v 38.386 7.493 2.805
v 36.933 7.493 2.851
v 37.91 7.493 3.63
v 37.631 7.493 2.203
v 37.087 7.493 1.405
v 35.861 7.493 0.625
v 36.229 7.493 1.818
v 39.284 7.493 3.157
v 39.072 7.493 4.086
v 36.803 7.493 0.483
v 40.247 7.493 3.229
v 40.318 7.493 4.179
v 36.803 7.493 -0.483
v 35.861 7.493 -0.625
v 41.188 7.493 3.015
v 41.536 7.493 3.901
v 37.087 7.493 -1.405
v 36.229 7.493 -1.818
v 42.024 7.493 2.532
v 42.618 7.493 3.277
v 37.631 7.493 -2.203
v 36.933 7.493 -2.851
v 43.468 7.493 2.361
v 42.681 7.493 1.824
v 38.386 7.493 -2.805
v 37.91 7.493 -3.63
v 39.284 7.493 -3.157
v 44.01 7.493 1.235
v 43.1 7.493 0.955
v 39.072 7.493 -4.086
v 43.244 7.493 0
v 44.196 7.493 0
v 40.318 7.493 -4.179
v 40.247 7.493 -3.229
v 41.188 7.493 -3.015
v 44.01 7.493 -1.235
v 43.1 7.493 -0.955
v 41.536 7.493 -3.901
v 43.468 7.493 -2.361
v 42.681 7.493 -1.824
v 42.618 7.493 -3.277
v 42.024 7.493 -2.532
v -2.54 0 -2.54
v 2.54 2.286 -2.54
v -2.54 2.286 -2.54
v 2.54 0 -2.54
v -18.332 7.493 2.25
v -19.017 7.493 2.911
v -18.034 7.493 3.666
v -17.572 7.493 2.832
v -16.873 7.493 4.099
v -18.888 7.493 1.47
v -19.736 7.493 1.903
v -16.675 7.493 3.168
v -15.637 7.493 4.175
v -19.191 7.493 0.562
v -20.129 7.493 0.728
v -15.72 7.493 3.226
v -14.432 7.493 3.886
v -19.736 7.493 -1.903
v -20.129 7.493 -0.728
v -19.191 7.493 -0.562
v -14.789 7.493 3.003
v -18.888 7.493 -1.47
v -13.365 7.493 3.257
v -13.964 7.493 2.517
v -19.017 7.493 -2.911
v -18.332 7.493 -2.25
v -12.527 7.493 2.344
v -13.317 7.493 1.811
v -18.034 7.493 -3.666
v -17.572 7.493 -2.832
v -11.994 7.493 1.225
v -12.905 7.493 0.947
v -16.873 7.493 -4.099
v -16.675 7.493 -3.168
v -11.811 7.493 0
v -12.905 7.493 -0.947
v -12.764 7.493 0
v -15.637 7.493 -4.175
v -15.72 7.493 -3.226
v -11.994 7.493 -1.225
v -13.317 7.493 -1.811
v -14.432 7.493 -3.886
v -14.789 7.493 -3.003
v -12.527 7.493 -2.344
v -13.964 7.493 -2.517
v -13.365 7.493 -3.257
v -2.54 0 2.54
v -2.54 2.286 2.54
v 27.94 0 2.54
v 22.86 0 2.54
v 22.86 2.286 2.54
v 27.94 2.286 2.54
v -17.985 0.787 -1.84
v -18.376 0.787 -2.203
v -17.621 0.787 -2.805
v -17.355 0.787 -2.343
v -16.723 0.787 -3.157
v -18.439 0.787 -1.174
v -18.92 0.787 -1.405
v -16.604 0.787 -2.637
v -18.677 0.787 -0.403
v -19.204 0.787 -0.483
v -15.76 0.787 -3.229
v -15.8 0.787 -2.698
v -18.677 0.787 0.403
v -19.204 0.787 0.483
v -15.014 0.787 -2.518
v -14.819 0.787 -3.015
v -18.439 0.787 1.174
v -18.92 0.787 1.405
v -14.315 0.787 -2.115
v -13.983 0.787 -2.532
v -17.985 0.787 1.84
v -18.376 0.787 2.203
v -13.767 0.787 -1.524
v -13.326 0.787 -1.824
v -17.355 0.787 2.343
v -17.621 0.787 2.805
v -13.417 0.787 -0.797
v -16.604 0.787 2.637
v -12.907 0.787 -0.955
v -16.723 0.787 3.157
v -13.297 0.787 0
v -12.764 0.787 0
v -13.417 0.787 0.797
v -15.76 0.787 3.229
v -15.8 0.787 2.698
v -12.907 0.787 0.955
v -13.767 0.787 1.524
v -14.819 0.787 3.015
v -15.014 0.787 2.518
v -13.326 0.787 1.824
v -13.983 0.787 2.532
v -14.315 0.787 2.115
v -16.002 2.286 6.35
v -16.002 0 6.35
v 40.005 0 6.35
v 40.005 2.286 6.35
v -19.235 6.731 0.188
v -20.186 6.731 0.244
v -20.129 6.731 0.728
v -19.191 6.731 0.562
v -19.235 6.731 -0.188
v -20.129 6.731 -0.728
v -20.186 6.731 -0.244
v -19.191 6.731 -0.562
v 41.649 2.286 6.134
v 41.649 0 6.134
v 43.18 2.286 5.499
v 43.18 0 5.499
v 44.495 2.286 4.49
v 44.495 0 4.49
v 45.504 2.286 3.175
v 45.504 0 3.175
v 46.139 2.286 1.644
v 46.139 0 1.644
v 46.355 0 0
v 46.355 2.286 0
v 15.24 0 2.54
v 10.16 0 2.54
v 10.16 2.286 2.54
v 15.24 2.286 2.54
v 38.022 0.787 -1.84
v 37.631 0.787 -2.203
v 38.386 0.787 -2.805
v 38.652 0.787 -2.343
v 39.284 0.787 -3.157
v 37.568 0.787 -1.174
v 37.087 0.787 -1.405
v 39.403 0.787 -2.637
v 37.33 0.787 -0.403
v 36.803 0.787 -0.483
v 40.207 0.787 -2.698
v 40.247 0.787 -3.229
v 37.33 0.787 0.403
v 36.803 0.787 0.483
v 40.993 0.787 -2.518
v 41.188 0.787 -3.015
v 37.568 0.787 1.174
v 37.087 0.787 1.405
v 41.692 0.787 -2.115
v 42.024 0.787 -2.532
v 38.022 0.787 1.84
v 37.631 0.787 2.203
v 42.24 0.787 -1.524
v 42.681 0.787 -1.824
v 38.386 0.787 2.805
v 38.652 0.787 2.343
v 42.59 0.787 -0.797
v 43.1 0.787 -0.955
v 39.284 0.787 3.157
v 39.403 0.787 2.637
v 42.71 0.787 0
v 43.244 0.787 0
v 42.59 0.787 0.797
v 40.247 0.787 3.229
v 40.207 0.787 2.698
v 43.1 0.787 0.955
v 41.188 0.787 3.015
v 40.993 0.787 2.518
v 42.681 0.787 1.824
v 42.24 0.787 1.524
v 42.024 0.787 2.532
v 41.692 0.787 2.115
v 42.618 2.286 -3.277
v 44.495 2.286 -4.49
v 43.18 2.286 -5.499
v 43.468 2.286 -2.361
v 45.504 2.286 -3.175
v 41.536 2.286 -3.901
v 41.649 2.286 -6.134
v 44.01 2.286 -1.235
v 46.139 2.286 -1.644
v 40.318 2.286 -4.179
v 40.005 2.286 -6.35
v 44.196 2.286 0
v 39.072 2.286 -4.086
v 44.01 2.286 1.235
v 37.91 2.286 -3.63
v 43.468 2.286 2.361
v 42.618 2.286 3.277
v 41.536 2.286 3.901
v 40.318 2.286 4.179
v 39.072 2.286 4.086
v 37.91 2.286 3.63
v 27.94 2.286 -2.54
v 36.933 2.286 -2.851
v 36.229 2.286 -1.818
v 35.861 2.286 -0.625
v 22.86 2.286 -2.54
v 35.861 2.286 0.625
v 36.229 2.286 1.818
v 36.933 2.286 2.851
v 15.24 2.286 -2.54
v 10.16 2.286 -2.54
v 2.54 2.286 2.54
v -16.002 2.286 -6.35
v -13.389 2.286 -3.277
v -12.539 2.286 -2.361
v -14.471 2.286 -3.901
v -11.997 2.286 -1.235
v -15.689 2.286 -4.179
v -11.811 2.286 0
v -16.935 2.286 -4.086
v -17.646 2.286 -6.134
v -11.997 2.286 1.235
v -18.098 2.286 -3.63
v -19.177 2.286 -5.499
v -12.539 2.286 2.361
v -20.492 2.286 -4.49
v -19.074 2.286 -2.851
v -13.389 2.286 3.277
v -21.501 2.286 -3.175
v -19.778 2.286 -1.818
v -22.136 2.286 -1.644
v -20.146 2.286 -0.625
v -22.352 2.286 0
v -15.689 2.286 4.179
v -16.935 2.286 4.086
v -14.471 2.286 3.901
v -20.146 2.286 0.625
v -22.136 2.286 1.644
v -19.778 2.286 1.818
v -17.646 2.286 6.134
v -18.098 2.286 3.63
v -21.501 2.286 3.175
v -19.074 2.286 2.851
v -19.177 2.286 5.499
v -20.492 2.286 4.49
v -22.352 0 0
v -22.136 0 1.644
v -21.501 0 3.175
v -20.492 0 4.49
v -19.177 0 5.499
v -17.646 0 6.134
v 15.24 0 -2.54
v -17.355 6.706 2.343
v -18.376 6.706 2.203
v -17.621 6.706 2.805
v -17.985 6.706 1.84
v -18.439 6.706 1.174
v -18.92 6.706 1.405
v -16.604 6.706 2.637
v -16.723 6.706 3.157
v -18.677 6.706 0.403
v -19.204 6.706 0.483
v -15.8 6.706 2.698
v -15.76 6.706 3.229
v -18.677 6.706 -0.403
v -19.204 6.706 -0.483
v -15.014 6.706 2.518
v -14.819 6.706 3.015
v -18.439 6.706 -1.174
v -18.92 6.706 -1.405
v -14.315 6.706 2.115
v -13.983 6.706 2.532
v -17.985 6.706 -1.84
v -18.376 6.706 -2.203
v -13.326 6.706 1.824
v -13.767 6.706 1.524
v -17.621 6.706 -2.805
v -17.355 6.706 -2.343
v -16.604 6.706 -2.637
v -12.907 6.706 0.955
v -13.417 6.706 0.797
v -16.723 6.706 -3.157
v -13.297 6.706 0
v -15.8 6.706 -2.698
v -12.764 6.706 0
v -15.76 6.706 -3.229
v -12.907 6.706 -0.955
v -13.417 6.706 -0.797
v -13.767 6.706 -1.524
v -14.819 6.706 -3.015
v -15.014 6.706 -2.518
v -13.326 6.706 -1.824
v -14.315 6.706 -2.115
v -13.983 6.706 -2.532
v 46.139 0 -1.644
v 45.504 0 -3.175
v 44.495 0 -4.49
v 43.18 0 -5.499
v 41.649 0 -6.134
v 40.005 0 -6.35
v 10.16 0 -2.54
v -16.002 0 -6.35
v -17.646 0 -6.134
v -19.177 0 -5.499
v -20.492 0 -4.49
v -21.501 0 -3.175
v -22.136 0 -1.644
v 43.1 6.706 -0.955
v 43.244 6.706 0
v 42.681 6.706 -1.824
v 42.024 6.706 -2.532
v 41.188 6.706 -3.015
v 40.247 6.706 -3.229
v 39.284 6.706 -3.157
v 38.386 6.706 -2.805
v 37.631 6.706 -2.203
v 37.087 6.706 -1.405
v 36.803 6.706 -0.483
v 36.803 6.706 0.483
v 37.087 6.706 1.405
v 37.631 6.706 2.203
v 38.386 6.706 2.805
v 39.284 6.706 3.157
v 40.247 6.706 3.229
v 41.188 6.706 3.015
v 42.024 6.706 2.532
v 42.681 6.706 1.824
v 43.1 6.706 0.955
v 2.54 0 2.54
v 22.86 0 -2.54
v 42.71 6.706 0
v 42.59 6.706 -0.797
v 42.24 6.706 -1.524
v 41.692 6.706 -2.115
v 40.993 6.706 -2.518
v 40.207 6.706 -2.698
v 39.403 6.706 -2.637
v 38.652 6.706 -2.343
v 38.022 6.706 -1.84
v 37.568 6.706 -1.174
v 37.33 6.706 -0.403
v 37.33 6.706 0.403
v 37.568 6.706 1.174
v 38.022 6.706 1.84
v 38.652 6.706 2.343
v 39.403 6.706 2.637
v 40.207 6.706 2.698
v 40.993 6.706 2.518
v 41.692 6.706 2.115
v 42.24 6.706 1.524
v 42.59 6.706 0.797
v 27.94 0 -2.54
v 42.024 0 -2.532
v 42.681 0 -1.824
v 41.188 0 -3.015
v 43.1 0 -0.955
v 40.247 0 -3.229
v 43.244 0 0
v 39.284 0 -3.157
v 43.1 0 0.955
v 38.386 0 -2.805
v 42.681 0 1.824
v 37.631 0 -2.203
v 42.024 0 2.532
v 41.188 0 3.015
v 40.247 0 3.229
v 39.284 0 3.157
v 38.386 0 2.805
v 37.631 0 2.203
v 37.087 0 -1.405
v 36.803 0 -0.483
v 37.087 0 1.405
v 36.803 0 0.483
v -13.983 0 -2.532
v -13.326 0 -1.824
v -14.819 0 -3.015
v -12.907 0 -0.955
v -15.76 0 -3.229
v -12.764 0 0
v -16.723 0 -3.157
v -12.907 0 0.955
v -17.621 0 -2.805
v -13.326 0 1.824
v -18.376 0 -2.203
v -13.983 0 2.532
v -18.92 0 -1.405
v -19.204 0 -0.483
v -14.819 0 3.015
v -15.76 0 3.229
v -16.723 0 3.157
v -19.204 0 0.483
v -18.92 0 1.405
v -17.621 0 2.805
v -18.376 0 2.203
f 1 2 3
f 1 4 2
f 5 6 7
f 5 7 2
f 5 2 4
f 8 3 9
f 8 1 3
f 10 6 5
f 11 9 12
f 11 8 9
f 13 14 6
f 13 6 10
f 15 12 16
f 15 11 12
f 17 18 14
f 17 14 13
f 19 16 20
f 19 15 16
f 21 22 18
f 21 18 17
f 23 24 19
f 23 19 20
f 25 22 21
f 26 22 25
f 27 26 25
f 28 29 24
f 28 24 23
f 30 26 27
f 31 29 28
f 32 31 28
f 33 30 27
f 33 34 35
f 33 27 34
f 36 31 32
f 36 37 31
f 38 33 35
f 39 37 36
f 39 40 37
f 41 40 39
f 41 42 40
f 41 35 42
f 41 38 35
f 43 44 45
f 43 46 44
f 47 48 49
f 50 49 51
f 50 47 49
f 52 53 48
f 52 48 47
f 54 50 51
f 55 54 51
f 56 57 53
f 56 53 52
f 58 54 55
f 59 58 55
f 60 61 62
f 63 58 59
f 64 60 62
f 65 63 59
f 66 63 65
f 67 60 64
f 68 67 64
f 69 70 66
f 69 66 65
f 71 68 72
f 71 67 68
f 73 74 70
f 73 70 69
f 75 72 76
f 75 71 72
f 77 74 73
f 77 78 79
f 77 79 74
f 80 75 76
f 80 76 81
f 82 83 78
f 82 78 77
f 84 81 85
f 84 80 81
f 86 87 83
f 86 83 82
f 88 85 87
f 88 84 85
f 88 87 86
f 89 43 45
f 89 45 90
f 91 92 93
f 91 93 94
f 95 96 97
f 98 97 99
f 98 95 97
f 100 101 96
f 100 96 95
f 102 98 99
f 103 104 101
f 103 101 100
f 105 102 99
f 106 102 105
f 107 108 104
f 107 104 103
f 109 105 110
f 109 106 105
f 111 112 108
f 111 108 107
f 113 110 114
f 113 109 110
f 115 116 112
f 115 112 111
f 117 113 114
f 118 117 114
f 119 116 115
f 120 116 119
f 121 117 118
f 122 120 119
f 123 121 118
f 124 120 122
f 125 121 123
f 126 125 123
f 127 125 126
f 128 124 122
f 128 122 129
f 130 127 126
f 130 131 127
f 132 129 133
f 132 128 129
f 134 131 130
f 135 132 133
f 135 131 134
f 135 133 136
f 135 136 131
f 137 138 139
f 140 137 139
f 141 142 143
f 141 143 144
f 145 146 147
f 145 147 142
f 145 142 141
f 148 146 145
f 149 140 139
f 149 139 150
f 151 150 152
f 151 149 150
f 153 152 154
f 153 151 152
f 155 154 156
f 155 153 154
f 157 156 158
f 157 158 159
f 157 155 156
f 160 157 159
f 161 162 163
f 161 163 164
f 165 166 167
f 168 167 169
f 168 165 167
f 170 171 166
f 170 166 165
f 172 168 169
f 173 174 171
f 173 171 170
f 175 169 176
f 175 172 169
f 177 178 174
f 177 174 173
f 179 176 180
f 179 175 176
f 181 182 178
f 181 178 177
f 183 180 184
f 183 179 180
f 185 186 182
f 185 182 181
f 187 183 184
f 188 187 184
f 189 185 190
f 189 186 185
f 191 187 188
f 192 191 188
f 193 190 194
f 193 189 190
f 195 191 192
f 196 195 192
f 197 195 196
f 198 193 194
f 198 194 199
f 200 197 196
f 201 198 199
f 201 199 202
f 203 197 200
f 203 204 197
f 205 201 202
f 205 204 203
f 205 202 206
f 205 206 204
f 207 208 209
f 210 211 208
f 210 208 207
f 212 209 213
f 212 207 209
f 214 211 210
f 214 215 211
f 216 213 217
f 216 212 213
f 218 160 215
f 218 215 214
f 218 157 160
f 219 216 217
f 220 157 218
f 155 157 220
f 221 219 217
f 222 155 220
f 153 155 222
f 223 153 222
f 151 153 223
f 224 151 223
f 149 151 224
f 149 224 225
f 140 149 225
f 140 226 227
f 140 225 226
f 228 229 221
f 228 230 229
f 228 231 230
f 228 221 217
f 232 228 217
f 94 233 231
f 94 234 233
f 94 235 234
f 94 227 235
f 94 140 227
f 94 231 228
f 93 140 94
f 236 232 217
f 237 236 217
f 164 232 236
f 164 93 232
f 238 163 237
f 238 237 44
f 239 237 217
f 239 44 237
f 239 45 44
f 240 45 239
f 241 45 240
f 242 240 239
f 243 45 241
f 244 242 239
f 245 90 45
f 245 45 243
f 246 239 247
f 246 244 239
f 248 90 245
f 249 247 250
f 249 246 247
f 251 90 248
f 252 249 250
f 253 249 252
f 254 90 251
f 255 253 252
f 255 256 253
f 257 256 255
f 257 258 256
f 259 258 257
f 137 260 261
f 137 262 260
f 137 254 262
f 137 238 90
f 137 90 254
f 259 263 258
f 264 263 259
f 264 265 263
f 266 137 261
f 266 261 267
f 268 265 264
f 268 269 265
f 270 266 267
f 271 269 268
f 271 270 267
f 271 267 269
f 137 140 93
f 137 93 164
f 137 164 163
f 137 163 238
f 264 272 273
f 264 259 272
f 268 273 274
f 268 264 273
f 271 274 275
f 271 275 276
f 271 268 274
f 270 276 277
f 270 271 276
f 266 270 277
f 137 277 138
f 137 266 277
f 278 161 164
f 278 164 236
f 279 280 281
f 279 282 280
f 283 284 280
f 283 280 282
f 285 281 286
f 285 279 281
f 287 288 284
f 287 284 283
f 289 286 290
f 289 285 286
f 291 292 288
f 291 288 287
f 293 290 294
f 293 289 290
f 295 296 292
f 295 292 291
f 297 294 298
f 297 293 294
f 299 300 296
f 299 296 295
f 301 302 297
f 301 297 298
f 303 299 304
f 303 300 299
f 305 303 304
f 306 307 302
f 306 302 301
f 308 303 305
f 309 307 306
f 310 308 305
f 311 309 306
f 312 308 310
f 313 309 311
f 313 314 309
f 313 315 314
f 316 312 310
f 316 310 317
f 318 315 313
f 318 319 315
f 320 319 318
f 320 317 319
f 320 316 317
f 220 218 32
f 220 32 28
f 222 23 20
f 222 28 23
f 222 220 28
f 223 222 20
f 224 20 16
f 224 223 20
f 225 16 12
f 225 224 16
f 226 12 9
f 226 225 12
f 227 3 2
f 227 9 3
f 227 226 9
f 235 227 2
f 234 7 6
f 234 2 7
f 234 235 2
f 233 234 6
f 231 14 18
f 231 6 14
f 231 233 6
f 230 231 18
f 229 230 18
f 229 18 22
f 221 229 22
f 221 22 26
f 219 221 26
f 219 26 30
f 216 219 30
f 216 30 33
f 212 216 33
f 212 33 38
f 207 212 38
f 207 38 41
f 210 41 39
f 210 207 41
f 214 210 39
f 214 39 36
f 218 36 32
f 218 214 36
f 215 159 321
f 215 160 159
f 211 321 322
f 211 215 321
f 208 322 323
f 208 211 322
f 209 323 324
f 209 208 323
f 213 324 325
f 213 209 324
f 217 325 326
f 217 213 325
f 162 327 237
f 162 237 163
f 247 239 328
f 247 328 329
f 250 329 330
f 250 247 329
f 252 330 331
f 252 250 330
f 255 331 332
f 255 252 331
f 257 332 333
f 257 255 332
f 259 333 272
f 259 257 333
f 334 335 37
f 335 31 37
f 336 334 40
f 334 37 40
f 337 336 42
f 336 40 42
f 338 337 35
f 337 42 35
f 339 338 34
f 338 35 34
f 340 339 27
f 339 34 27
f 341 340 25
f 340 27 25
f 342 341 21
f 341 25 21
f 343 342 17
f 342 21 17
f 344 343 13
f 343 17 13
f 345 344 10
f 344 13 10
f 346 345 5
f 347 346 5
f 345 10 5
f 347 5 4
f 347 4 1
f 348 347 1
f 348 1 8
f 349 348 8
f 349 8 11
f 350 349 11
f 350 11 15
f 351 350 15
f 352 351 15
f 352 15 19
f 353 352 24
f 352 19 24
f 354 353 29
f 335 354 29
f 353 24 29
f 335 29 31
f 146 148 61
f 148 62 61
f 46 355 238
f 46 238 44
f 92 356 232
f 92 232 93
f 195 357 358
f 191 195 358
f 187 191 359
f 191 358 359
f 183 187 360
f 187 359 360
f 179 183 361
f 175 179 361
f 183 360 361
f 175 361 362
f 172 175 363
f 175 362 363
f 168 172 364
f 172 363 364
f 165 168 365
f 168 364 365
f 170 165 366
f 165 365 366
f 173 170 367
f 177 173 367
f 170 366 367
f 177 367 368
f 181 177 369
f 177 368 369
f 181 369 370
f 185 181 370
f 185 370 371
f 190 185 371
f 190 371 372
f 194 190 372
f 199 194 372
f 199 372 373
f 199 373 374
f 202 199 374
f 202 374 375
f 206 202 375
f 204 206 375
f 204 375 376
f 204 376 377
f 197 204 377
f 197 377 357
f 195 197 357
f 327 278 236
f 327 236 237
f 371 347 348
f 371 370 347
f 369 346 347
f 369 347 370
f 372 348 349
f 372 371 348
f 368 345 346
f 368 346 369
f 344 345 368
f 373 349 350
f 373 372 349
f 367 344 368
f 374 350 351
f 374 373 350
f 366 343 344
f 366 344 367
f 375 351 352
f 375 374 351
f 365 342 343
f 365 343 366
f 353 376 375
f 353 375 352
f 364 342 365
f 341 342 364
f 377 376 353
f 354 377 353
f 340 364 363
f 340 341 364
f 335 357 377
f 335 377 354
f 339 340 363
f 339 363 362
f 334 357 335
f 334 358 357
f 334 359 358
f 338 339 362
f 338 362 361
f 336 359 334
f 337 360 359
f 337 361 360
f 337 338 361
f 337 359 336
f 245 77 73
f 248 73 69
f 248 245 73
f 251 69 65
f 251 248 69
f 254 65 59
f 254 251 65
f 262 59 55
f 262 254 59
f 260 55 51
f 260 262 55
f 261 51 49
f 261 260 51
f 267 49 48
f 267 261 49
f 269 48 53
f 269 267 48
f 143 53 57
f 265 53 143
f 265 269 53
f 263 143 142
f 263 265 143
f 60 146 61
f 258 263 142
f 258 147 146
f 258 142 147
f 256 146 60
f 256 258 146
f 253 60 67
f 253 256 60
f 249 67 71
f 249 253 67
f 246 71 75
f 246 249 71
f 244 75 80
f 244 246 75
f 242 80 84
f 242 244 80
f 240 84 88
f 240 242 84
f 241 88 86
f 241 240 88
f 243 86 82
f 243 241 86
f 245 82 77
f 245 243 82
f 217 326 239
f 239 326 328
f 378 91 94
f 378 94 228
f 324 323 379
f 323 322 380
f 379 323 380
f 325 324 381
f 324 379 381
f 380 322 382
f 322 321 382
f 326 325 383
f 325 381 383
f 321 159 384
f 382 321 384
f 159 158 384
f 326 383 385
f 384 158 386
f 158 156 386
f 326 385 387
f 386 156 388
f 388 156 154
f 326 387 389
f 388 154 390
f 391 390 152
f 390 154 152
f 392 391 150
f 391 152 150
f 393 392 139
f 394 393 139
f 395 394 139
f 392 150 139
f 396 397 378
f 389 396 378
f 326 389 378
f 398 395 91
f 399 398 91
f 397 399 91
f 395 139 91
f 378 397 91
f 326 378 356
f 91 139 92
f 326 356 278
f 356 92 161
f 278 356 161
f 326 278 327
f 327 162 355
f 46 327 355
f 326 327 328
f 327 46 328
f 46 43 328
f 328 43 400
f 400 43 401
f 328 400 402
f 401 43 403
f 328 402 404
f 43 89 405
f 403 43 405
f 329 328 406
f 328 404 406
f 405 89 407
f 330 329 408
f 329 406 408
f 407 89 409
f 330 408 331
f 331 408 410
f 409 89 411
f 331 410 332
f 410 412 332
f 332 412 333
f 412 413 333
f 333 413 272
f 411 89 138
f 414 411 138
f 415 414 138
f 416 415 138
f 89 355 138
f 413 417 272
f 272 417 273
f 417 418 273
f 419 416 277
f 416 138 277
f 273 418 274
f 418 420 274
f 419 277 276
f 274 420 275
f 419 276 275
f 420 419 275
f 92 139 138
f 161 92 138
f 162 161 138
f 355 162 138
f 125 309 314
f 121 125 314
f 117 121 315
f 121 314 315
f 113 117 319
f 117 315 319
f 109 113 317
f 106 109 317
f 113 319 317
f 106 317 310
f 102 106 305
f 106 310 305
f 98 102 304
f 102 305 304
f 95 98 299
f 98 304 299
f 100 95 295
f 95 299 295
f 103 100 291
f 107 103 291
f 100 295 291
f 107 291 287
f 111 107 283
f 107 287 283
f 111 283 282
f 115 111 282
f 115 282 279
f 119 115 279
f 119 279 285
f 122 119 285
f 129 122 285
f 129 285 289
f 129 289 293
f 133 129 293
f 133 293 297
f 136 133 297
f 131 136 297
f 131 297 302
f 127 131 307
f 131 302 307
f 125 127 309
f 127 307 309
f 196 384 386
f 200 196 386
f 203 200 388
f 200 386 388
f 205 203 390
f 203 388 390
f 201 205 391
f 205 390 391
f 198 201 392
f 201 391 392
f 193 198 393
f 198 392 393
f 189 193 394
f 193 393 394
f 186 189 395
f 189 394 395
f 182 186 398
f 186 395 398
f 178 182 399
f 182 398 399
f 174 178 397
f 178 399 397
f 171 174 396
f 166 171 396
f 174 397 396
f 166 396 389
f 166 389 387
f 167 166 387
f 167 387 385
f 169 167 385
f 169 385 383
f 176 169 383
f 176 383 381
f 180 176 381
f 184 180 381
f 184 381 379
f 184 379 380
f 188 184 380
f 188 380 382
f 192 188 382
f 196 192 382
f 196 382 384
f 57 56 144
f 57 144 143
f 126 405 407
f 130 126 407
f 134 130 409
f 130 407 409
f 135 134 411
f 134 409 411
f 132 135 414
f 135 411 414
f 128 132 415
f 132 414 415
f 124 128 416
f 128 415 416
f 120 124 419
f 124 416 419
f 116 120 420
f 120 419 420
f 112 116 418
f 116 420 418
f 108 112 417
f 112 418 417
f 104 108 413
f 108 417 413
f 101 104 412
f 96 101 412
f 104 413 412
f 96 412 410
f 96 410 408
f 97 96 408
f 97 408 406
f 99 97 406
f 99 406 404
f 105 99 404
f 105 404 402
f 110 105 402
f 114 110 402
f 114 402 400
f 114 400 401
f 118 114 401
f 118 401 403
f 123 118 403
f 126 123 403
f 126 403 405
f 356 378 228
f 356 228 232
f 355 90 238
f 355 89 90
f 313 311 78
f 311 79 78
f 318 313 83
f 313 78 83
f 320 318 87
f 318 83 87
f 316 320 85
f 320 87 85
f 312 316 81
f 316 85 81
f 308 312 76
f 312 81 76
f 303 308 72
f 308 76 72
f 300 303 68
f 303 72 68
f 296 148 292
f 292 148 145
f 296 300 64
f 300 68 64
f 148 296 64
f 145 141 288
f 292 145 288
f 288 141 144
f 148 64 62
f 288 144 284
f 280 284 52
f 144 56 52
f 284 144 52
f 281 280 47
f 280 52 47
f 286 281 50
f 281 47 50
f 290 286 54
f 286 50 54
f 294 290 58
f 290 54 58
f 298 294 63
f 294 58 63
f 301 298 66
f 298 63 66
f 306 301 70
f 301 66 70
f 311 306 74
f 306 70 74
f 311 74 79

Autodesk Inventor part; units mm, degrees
ref_plane "YZ Plane" through (0, 0, 0) normal (1, 0, 0) x (0, 1, 0)
ref_plane "XZ Plane" through (0, 0, 0) normal (0, 1, 0) x (-1, 0, 0)
ref_plane "XY Plane" through (0, 0, 0) normal (0, 0, 1) x (1, 0, 0)
sketch "Sketch1" plane through (0, 0, 0) normal (0, 1, 0) x (-1, 0, 0)
  line L0 (22.352, 6.35) -> (-46.355, 6.35)
  line L1 (-46.355, 6.35) -> (-46.355, -6.35)
  line L2 (-46.355, -6.35) -> (22.352, -6.35)
  line L3 (22.352, -6.35) -> (22.352, 6.35)
  line L4 (-2.54, -2.54) -> (2.54, -2.54)
  line L5 (2.54, -2.54) -> (2.54, 2.54)
  line L6 (2.54, 2.54) -> (-2.54, 2.54)
  line L7 (-2.54, 2.54) -> (-2.54, -2.54)
  line L8 (-2.54, -2.54) -> (2.54, 2.54) construction
  line L9 (2.54, -2.54) -> (-2.54, 2.54) construction
  line L10 (-10.16, 2.54) -> (-15.24, 2.54)
  line L11 (-15.24, 2.54) -> (-15.24, -2.54)
  line L12 (-15.24, -2.54) -> (-10.16, -2.54)
  line L13 (-10.16, -2.54) -> (-10.16, 2.54)
  line L14 (-10.16, 2.54) -> (-15.24, -2.54) construction
  line L15 (-15.24, 2.54) -> (-10.16, -2.54) construction
  line L16 (-22.86, 2.54) -> (-27.94, 2.54)
  line L17 (-27.94, 2.54) -> (-27.94, -2.54)
  line L18 (-27.94, -2.54) -> (-22.86, -2.54)
  line L19 (-22.86, -2.54) -> (-22.86, 2.54)
  line L20 (-22.86, 2.54) -> (-27.94, -2.54) construction
  line L21 (-27.94, 2.54) -> (-22.86, -2.54) construction
  point P0 (0, 0)
  point P1 (-12.7, 0)
  point P2 (-25.4, 0)
  dimension "d0" = 68.707
  dimension "d1" = 12.7
  dimension "d2" = 5.08
  dimension "d3" = 5.08
  dimension "d4" = 5.08
  dimension "d5" = 5.08
  dimension "d6" = 12.7
  dimension "d7" = 12.7
  dimension "d8" = 6.35
  dimension "d9" = 22.352
  dimension "d37" = 5.08
  dimension "d38" = 5.08
extrude "Extrusion1" add sketch "Sketch1" along normal blind 2.286
sketch "Sketch2" plane through (0, 2.286, 0) normal (0, 1, 0) x (1, 0, 0)
  line L0 (-22.352, 6.35) -> (-22.352, -6.35) projected
  circle A0 centre (-16.002, 0) radius 4.191
  point P0 (0, 0)
  dimension "d12" = 6.35
  dimension "d13" = 8.382
extrude "Extrusion2" add sketch "Sketch2" along normal blind 5.207
sketch "Sketch3" plane through (-16.002, 7.493, 0) normal (0, 1, 0) x (1, 0, 0)
  circle A0 centre (0, 0) radius 3.2385
  point P0 (16.002, 0)
  dimension "d16" = 6.477
extrude "Extrusion3" cut sketch "Sketch3" against normal blind 0.7874
sketch "Sketch4" plane through (0, 0, 0) normal (0, -1, 0) x (1, 0, 0)
  circle A0 centre (-16.002, 0) radius 3.2385 projected
  circle A1 centre (-16.002, 0) radius 3.2385
  point P0 (0, 0)
  dimension "d39" = 6.477
extrude "Extrusion4" cut sketch "Sketch4" against normal blind 0.7874
sketch "Sketch5" plane through (-16.002, 6.7056, 0) normal (0, 1, 0) x (1, 0, 0)
  circle A0 centre (0, 0) radius 2.7051
  point P0 (16.002, 0)
  dimension "d21" = 5.4102
extrude "Extrusion5" cut sketch "Sketch5" against normal through all
sketch "Sketch6" plane through (0, 2.286, 0) normal (0, 1, 0) x (1, 0, 0)
  line L0 (46.355, -6.35) -> (46.355, 6.35) projected
  circle A0 centre (40.005, 0) radius 4.191
  point P0 (0, 0)
  dimension "d24" = 6.35
  dimension "d25" = 8.382
extrude "Extrusion6" add sketch "Sketch6" along normal blind 5.207
sketch "Sketch7" plane through (40.005, 7.493, 0) normal (0, 1, 0) x (1, 0, 0)
  circle A0 centre (0, 0) radius 3.2385
  point P0 (-40.005, 0)
  dimension "d28" = 6.477
extrude "Extrusion7" cut sketch "Sketch7" against normal blind 0.7874
sketch "Sketch8" plane through (0, 0, 0) normal (0, -1, 0) x (1, 0, 0)
  circle A0 centre (40.005, 0) radius 3.2385 projected
  circle A1 centre (40.005, 0) radius 3.2385
  point P0 (0, 0)
  dimension "d40" = 6.477
extrude "Extrusion8" cut sketch "Sketch8" against normal blind 0.7874
sketch "Sketch9" plane through (40.005, 6.7056, 0) normal (0, 1, 0) x (1, 0, 0)
  circle A0 centre (0, 0) radius 2.7051
  point P0 (-40.005, 0)
  dimension "d33" = 5.4102
extrude "Extrusion9" cut sketch "Sketch9" against normal through all
fillet "Fillet1" radius 6.35 4 edges at (46.355, 1.143, 6.35) (46.355, 1.143, -6.35) (-22.352, 1.143, 6.35) (-22.352, 1.143, -6.35)
sketch "Sketch12" plane through (-16.002, 7.493, 0) normal (0, 1, 0) x (1, 0, 0)
  circle A0 centre (0, 0) radius 4.191 projected
  line L0 (0, 0) -> (4.0259, 0) construction
  line L1 (0, 0) -> (4.0259, 0) construction
  circle A1 centre (0, 0) radius 3.2385 projected
  line L2 (-3.1893, 0.5624) -> (-4.1273, 0.7278)
  line L3 (-3.1893, -0.5624) -> (-4.1273, -0.7278)
  arc A2 (-3.1893, 0.5624) -> (-3.1893, -0.5624) centre (0, 0) ccw
  arc A3 (-4.1273, 0.7278) -> (-4.1273, -0.7278) centre (0, 0) ccw
  point P0 (16.002, 0)
  point P1 (-2.9392, 0.5183)
extrude "Extrusion11" cut sketch "Sketch12" against normal blind 0.762 contours L2 A1 L3 A0 picked at (-3.8669, 0.0628)
properties part number "VexLegoMountThick3"
